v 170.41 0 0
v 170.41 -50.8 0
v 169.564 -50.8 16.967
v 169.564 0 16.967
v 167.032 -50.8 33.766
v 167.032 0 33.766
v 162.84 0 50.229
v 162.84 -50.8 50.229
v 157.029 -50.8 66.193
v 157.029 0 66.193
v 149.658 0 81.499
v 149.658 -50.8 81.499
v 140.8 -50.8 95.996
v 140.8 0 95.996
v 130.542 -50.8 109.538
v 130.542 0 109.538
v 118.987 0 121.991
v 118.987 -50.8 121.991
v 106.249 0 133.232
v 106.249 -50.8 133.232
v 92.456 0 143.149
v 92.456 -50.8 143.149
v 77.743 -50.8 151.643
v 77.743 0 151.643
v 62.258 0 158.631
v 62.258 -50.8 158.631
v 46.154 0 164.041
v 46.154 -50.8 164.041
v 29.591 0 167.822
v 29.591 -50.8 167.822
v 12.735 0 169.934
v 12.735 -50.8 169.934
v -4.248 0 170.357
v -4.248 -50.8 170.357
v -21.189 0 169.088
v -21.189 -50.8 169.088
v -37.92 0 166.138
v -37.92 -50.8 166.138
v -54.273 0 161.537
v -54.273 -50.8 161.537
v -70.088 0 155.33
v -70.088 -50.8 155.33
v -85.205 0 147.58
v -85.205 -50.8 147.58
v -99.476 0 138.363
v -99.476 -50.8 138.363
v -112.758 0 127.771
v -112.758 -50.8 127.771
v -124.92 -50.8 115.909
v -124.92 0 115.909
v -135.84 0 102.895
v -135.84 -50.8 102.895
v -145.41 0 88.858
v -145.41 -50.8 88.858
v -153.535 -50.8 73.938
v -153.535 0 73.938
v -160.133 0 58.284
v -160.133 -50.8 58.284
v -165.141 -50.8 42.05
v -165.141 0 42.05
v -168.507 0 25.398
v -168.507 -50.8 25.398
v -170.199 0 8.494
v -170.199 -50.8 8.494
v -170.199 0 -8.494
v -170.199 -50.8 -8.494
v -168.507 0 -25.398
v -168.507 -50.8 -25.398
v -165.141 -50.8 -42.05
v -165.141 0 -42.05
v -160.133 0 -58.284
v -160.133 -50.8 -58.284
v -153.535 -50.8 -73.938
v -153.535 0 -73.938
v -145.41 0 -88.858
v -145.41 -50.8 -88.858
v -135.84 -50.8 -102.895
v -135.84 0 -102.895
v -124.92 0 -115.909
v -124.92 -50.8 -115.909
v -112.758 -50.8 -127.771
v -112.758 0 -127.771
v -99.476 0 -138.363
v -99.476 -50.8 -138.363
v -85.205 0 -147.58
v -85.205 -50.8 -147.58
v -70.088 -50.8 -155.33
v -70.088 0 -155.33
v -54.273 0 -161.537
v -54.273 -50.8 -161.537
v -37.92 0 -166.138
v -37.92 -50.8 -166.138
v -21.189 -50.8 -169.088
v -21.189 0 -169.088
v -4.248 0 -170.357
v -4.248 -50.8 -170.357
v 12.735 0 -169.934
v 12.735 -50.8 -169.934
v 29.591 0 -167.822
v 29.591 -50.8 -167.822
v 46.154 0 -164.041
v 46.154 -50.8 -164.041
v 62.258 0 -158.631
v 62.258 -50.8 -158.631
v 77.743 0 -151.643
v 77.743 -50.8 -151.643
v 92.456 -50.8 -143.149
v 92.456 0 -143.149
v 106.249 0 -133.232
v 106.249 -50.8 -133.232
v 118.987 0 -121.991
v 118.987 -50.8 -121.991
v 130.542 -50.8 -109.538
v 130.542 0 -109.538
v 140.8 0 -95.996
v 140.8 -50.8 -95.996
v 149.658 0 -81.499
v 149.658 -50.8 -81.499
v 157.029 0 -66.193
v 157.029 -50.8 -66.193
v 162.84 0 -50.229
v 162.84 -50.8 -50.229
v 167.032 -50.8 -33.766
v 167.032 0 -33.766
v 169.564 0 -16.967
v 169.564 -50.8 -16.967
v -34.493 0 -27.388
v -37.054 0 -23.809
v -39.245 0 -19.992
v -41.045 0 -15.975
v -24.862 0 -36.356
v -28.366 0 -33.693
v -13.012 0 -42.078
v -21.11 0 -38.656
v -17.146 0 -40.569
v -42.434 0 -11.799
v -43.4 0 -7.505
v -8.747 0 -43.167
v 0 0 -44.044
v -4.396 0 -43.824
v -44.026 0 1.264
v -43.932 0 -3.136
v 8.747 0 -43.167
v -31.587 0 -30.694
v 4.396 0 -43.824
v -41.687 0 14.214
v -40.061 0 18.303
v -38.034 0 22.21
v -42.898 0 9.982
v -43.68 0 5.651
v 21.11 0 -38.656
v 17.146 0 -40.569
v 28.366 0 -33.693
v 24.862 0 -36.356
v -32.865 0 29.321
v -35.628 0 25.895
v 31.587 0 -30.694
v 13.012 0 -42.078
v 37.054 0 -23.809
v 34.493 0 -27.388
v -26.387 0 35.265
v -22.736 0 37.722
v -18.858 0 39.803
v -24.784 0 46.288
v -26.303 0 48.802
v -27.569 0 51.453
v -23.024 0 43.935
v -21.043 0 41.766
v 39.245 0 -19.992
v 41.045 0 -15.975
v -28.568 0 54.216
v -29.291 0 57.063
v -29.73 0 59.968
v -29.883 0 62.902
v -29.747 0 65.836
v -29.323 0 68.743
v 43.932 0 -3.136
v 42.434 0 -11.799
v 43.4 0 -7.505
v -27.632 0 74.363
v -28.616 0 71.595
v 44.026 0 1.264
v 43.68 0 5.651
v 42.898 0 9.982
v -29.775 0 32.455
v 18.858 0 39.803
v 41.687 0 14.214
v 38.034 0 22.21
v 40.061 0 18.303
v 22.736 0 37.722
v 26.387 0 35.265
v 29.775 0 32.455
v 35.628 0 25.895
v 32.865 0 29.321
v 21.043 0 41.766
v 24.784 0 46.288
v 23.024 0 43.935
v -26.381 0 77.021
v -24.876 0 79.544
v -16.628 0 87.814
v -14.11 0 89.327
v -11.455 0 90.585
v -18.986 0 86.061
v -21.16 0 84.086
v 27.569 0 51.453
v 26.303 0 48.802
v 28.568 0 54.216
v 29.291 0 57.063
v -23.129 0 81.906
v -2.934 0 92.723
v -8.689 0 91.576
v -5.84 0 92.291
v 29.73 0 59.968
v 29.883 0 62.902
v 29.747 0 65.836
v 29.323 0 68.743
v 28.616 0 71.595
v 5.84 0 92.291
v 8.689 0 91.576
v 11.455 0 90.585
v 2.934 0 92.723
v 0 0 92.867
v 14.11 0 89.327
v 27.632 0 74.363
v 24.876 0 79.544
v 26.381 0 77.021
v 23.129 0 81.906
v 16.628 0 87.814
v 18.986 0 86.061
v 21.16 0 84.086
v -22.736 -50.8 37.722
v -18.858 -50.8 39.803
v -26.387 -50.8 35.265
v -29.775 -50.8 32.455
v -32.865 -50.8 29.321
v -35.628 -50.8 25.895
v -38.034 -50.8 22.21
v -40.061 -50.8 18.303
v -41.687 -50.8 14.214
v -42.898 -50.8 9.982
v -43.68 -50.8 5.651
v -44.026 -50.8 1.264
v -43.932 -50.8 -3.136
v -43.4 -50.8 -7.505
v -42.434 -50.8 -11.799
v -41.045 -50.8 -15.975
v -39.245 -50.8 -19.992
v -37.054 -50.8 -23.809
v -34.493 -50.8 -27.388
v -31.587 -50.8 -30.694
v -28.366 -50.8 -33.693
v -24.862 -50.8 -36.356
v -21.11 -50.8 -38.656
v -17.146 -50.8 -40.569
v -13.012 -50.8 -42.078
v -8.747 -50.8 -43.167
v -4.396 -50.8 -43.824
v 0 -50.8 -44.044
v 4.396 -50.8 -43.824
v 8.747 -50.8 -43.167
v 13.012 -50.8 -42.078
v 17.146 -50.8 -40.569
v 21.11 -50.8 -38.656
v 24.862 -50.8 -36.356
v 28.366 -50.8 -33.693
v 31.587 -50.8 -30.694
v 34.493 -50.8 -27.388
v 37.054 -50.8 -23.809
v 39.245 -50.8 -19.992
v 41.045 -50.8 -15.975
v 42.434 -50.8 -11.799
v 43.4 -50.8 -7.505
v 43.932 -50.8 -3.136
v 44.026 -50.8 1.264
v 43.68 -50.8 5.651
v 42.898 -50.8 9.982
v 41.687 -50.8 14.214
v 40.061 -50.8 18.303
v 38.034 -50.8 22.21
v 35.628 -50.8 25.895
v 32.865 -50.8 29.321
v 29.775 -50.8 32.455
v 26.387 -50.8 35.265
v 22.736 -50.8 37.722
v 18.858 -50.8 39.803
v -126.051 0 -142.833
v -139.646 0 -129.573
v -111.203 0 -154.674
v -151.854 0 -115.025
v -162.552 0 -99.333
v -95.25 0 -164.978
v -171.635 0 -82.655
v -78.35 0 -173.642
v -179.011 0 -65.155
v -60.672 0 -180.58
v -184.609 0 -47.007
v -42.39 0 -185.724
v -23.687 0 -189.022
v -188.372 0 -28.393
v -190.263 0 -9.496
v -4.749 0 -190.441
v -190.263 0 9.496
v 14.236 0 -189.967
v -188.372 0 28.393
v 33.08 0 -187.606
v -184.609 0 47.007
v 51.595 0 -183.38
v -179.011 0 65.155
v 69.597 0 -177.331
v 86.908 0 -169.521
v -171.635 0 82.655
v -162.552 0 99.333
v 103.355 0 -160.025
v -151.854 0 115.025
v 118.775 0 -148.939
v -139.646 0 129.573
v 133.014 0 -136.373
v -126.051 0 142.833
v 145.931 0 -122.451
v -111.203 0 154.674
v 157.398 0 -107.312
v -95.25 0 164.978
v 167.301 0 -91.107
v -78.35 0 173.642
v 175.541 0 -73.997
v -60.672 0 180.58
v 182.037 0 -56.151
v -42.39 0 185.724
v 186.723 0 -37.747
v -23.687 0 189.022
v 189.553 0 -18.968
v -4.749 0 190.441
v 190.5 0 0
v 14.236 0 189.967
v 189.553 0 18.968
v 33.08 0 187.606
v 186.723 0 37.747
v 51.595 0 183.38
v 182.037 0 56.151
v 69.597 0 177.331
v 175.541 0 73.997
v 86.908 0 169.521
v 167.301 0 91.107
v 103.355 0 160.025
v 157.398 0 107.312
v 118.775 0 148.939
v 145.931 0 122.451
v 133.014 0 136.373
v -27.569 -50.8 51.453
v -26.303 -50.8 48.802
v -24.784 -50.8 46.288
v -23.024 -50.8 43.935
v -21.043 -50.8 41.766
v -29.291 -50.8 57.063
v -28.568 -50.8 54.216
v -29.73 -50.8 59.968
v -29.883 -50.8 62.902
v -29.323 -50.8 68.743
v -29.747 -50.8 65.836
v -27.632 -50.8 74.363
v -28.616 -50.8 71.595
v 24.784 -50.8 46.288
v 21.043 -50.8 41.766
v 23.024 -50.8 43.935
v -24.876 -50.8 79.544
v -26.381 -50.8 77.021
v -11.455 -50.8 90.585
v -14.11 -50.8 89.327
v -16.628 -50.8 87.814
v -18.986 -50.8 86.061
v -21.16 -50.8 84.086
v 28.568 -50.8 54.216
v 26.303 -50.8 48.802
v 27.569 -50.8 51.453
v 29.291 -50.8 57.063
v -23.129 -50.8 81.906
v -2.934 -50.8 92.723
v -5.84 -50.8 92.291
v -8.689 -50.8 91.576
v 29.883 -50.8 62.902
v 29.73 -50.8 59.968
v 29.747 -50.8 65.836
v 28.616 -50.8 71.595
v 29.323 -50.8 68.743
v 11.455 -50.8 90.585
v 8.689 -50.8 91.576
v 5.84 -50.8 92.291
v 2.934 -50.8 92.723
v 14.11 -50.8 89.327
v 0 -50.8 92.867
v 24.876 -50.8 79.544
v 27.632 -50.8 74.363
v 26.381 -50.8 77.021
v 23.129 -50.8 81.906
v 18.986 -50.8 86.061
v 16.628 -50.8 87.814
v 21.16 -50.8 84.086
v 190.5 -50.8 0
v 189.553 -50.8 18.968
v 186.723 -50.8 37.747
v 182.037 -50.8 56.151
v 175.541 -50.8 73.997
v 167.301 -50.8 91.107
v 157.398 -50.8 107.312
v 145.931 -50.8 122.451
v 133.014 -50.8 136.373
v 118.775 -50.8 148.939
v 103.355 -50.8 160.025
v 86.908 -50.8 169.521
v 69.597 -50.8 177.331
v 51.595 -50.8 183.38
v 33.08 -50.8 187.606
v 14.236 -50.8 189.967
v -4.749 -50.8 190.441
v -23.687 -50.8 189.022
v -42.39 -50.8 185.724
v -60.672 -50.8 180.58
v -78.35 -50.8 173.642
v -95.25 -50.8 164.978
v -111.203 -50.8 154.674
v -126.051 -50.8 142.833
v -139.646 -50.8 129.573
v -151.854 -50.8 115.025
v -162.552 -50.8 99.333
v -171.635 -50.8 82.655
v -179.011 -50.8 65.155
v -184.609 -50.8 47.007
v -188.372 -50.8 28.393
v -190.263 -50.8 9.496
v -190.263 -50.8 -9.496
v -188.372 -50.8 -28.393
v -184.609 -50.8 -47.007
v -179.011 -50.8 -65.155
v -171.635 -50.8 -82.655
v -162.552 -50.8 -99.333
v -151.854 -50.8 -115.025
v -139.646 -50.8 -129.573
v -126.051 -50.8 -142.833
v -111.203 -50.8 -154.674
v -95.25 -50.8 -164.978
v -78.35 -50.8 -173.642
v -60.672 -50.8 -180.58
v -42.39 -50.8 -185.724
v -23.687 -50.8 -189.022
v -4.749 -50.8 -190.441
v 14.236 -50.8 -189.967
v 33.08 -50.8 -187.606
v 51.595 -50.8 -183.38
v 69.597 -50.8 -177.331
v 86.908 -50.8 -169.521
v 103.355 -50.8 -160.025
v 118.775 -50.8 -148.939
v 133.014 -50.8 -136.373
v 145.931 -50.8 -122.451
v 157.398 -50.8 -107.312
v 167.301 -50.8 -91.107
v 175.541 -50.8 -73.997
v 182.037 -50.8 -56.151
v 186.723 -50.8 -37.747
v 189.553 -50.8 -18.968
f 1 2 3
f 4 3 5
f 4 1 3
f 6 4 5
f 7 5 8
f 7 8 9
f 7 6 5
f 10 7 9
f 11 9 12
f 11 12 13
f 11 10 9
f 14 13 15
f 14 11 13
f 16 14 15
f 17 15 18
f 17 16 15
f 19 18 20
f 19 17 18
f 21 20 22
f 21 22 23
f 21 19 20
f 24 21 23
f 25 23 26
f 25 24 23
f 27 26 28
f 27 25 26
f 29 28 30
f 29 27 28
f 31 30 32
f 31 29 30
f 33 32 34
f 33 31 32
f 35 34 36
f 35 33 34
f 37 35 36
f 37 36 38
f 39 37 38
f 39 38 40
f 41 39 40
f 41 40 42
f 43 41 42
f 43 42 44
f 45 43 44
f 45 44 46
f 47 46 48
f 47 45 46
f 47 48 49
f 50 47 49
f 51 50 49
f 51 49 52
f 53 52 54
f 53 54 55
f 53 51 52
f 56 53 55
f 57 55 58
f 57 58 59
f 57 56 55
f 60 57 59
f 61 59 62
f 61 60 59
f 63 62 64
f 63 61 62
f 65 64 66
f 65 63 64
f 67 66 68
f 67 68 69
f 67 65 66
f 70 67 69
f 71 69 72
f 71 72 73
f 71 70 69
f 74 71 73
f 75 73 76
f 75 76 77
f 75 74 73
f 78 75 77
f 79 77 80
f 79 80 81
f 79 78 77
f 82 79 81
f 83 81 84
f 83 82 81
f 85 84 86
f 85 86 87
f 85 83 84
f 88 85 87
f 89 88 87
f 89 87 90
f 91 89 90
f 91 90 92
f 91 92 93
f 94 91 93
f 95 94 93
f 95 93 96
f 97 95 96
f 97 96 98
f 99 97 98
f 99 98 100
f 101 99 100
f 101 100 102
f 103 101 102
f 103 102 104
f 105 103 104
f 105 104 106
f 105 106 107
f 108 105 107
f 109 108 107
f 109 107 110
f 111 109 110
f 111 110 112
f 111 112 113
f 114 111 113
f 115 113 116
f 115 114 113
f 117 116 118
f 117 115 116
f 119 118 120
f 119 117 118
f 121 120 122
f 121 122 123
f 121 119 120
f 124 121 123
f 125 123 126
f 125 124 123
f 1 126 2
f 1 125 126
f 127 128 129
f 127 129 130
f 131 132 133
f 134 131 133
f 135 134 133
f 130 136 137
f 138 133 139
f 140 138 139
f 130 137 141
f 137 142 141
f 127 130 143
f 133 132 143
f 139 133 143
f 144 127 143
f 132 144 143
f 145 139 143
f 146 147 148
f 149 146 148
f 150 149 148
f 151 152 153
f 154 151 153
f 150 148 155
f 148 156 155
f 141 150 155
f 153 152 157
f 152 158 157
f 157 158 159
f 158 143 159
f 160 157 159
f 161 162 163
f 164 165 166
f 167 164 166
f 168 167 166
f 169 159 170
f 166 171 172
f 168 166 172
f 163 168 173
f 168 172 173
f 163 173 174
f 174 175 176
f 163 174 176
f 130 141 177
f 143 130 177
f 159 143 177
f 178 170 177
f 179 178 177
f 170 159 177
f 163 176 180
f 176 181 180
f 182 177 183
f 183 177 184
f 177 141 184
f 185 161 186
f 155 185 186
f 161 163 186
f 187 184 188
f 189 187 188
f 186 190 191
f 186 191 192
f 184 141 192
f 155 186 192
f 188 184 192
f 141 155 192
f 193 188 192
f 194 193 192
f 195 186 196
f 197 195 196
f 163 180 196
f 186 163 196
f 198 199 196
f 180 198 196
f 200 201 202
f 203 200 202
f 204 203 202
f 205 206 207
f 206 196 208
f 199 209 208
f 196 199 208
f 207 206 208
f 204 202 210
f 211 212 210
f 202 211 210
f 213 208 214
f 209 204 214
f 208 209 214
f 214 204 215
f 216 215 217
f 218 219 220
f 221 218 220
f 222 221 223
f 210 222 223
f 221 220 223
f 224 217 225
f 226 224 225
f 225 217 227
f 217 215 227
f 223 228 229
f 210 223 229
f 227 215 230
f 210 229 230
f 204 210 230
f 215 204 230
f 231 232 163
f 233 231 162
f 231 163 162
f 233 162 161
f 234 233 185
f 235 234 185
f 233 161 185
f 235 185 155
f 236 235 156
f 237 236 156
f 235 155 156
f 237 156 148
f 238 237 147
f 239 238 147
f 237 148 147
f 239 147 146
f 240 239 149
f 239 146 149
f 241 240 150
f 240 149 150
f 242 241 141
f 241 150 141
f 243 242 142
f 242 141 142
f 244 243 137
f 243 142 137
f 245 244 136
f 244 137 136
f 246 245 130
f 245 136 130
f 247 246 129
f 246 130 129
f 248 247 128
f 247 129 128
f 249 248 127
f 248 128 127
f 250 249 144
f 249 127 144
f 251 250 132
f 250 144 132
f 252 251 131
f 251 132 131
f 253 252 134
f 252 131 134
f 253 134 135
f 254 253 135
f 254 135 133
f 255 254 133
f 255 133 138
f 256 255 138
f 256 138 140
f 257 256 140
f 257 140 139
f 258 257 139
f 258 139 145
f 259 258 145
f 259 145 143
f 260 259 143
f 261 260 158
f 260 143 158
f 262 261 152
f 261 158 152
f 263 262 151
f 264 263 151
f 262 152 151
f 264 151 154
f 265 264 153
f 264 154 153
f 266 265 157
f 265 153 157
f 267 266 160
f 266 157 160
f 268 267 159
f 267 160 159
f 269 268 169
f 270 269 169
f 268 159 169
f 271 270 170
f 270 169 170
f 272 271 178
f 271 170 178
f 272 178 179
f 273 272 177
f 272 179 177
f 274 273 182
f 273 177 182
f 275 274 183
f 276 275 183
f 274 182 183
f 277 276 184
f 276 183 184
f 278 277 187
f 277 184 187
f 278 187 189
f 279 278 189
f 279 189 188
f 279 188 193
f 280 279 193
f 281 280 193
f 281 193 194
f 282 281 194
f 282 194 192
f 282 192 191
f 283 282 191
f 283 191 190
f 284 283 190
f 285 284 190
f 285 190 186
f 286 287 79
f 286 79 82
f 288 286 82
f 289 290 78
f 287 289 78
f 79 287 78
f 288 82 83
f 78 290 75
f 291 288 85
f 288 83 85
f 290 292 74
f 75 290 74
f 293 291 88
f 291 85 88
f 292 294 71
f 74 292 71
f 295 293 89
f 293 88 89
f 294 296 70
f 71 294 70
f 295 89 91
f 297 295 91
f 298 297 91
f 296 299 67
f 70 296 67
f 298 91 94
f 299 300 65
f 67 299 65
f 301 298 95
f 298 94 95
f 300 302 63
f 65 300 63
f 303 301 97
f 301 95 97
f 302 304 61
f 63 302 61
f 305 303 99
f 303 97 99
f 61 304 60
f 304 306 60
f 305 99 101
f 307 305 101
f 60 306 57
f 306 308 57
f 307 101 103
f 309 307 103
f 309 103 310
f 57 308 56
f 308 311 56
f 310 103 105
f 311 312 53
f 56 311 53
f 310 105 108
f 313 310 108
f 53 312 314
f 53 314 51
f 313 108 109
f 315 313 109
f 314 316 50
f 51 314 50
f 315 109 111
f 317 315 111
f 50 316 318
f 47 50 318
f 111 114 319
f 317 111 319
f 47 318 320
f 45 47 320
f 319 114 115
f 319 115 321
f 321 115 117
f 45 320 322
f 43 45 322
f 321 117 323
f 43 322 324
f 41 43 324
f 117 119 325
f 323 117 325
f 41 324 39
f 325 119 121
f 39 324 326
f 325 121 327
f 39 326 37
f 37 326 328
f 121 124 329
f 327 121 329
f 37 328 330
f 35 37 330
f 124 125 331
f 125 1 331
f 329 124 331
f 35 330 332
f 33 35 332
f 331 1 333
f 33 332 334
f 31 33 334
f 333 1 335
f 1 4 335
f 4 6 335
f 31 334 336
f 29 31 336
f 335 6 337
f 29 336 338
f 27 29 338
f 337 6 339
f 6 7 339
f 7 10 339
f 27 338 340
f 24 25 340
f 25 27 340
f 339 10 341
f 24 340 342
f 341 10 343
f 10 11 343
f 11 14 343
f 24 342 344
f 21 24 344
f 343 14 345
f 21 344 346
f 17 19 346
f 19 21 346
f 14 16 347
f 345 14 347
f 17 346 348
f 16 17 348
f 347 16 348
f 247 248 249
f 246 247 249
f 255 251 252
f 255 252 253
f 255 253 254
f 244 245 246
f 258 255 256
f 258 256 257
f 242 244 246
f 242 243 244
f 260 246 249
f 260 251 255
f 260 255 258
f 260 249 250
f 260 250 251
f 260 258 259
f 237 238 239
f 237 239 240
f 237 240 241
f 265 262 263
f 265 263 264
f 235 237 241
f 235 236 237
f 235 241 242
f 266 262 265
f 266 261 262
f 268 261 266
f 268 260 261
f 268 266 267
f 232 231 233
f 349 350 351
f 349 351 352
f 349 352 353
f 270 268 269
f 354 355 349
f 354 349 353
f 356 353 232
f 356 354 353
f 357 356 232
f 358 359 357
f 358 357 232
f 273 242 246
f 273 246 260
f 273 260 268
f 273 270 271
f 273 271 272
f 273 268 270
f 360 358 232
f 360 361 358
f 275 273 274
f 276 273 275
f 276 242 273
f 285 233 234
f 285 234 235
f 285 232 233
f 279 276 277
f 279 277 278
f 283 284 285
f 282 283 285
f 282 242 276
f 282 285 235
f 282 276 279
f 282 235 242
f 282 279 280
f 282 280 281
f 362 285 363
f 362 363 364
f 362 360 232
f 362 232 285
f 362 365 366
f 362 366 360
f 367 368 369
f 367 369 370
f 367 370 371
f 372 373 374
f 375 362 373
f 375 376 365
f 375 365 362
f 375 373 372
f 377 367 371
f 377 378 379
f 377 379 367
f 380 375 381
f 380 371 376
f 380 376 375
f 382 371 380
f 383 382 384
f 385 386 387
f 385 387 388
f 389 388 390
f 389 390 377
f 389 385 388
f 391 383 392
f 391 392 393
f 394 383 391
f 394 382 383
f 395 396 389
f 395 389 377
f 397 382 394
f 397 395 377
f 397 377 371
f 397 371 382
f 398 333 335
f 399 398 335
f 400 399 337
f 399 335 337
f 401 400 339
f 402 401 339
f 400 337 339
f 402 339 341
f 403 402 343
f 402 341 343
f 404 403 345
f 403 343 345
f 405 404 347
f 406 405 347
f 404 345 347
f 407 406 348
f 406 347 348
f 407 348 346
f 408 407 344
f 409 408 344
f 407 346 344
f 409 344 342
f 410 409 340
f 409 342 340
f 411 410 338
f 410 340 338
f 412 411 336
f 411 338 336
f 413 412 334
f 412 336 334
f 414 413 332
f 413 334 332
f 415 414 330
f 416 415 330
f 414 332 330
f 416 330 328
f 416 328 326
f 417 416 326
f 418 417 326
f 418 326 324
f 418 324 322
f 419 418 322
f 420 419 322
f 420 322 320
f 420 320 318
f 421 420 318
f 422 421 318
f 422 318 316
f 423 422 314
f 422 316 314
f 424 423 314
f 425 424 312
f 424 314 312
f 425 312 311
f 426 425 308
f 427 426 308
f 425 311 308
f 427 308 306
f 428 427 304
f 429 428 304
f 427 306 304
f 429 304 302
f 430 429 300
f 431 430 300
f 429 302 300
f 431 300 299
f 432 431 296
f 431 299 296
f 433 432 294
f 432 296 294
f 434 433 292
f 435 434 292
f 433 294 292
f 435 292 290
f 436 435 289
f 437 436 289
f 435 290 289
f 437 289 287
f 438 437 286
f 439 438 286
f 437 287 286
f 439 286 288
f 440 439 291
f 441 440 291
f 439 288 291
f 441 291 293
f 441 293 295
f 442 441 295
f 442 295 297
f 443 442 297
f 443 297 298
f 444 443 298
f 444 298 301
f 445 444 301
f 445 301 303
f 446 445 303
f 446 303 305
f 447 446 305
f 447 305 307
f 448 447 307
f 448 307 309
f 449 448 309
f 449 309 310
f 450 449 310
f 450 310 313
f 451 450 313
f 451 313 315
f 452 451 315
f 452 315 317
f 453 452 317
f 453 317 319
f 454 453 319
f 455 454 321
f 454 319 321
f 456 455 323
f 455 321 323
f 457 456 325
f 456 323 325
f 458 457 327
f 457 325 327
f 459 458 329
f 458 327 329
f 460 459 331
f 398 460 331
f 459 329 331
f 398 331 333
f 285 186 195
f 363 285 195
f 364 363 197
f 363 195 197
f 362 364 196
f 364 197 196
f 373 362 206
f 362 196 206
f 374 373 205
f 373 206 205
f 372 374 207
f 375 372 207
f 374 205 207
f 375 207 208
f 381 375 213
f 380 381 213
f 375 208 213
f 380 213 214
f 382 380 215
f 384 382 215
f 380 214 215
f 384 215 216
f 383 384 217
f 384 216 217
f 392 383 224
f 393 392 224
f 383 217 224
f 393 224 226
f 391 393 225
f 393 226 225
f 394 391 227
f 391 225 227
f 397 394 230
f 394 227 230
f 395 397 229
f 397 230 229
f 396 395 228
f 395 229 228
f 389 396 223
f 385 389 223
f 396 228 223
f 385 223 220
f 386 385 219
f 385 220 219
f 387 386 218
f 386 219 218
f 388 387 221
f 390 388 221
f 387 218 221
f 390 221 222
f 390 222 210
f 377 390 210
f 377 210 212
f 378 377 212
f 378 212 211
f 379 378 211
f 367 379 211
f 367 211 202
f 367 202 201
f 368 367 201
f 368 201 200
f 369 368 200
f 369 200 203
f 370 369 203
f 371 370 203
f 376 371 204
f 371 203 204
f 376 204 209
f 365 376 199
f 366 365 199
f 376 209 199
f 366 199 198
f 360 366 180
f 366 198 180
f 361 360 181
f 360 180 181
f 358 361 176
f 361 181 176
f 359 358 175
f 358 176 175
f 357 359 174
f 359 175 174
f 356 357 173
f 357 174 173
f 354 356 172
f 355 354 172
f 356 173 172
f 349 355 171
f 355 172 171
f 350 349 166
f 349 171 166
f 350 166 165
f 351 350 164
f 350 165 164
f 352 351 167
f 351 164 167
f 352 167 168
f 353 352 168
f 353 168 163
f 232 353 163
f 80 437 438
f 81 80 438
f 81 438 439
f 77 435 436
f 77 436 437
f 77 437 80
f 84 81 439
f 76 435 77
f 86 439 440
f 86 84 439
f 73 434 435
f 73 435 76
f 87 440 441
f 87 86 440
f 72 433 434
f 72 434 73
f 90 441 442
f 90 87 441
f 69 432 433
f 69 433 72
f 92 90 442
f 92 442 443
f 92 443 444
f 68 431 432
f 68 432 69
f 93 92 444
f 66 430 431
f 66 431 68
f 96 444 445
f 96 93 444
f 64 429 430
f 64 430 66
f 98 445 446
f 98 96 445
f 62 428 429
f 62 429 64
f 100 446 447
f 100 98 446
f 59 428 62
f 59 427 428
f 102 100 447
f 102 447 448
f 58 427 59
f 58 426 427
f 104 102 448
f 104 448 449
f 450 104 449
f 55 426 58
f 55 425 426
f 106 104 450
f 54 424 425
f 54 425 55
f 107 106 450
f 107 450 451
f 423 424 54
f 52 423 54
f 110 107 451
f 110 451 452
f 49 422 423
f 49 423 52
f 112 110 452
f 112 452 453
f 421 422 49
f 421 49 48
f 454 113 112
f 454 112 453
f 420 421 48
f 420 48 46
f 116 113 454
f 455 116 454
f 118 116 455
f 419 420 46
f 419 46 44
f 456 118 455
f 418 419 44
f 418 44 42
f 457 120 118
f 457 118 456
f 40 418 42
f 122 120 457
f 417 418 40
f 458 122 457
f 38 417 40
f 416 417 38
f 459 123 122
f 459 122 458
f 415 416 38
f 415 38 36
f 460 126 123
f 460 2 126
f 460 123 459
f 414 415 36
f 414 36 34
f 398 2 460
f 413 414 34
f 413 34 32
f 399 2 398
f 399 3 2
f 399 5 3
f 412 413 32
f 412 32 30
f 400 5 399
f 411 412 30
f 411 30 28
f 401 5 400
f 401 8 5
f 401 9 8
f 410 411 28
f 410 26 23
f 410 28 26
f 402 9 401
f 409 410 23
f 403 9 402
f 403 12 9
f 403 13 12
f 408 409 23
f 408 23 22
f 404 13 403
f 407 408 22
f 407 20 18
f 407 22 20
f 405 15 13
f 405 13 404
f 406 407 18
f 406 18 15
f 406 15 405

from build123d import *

# Parameters (mm, degrees)
F0_R     = 190.5
F0_R_2   = 170.410462
F1_DEPTH = 50.8


with BuildPart() as f1:
    # F0 (on Front) → F1 (new body)
    with BuildSketch(Plane.XZ):
        Circle(F0_R)
        Circle(F0_R_2, mode=Mode.SUBTRACT)
        with BuildLine():
            ThreePointArc((18.857672, 39.802754), (0, 92.867499), (-18.857672, 39.802754))
            ThreePointArc((-18.857672, 39.802754), (0, -44.043967), (18.857672, 39.802754))
        make_face()
    extrude(amount=F1_DEPTH)


solid = f1.part
